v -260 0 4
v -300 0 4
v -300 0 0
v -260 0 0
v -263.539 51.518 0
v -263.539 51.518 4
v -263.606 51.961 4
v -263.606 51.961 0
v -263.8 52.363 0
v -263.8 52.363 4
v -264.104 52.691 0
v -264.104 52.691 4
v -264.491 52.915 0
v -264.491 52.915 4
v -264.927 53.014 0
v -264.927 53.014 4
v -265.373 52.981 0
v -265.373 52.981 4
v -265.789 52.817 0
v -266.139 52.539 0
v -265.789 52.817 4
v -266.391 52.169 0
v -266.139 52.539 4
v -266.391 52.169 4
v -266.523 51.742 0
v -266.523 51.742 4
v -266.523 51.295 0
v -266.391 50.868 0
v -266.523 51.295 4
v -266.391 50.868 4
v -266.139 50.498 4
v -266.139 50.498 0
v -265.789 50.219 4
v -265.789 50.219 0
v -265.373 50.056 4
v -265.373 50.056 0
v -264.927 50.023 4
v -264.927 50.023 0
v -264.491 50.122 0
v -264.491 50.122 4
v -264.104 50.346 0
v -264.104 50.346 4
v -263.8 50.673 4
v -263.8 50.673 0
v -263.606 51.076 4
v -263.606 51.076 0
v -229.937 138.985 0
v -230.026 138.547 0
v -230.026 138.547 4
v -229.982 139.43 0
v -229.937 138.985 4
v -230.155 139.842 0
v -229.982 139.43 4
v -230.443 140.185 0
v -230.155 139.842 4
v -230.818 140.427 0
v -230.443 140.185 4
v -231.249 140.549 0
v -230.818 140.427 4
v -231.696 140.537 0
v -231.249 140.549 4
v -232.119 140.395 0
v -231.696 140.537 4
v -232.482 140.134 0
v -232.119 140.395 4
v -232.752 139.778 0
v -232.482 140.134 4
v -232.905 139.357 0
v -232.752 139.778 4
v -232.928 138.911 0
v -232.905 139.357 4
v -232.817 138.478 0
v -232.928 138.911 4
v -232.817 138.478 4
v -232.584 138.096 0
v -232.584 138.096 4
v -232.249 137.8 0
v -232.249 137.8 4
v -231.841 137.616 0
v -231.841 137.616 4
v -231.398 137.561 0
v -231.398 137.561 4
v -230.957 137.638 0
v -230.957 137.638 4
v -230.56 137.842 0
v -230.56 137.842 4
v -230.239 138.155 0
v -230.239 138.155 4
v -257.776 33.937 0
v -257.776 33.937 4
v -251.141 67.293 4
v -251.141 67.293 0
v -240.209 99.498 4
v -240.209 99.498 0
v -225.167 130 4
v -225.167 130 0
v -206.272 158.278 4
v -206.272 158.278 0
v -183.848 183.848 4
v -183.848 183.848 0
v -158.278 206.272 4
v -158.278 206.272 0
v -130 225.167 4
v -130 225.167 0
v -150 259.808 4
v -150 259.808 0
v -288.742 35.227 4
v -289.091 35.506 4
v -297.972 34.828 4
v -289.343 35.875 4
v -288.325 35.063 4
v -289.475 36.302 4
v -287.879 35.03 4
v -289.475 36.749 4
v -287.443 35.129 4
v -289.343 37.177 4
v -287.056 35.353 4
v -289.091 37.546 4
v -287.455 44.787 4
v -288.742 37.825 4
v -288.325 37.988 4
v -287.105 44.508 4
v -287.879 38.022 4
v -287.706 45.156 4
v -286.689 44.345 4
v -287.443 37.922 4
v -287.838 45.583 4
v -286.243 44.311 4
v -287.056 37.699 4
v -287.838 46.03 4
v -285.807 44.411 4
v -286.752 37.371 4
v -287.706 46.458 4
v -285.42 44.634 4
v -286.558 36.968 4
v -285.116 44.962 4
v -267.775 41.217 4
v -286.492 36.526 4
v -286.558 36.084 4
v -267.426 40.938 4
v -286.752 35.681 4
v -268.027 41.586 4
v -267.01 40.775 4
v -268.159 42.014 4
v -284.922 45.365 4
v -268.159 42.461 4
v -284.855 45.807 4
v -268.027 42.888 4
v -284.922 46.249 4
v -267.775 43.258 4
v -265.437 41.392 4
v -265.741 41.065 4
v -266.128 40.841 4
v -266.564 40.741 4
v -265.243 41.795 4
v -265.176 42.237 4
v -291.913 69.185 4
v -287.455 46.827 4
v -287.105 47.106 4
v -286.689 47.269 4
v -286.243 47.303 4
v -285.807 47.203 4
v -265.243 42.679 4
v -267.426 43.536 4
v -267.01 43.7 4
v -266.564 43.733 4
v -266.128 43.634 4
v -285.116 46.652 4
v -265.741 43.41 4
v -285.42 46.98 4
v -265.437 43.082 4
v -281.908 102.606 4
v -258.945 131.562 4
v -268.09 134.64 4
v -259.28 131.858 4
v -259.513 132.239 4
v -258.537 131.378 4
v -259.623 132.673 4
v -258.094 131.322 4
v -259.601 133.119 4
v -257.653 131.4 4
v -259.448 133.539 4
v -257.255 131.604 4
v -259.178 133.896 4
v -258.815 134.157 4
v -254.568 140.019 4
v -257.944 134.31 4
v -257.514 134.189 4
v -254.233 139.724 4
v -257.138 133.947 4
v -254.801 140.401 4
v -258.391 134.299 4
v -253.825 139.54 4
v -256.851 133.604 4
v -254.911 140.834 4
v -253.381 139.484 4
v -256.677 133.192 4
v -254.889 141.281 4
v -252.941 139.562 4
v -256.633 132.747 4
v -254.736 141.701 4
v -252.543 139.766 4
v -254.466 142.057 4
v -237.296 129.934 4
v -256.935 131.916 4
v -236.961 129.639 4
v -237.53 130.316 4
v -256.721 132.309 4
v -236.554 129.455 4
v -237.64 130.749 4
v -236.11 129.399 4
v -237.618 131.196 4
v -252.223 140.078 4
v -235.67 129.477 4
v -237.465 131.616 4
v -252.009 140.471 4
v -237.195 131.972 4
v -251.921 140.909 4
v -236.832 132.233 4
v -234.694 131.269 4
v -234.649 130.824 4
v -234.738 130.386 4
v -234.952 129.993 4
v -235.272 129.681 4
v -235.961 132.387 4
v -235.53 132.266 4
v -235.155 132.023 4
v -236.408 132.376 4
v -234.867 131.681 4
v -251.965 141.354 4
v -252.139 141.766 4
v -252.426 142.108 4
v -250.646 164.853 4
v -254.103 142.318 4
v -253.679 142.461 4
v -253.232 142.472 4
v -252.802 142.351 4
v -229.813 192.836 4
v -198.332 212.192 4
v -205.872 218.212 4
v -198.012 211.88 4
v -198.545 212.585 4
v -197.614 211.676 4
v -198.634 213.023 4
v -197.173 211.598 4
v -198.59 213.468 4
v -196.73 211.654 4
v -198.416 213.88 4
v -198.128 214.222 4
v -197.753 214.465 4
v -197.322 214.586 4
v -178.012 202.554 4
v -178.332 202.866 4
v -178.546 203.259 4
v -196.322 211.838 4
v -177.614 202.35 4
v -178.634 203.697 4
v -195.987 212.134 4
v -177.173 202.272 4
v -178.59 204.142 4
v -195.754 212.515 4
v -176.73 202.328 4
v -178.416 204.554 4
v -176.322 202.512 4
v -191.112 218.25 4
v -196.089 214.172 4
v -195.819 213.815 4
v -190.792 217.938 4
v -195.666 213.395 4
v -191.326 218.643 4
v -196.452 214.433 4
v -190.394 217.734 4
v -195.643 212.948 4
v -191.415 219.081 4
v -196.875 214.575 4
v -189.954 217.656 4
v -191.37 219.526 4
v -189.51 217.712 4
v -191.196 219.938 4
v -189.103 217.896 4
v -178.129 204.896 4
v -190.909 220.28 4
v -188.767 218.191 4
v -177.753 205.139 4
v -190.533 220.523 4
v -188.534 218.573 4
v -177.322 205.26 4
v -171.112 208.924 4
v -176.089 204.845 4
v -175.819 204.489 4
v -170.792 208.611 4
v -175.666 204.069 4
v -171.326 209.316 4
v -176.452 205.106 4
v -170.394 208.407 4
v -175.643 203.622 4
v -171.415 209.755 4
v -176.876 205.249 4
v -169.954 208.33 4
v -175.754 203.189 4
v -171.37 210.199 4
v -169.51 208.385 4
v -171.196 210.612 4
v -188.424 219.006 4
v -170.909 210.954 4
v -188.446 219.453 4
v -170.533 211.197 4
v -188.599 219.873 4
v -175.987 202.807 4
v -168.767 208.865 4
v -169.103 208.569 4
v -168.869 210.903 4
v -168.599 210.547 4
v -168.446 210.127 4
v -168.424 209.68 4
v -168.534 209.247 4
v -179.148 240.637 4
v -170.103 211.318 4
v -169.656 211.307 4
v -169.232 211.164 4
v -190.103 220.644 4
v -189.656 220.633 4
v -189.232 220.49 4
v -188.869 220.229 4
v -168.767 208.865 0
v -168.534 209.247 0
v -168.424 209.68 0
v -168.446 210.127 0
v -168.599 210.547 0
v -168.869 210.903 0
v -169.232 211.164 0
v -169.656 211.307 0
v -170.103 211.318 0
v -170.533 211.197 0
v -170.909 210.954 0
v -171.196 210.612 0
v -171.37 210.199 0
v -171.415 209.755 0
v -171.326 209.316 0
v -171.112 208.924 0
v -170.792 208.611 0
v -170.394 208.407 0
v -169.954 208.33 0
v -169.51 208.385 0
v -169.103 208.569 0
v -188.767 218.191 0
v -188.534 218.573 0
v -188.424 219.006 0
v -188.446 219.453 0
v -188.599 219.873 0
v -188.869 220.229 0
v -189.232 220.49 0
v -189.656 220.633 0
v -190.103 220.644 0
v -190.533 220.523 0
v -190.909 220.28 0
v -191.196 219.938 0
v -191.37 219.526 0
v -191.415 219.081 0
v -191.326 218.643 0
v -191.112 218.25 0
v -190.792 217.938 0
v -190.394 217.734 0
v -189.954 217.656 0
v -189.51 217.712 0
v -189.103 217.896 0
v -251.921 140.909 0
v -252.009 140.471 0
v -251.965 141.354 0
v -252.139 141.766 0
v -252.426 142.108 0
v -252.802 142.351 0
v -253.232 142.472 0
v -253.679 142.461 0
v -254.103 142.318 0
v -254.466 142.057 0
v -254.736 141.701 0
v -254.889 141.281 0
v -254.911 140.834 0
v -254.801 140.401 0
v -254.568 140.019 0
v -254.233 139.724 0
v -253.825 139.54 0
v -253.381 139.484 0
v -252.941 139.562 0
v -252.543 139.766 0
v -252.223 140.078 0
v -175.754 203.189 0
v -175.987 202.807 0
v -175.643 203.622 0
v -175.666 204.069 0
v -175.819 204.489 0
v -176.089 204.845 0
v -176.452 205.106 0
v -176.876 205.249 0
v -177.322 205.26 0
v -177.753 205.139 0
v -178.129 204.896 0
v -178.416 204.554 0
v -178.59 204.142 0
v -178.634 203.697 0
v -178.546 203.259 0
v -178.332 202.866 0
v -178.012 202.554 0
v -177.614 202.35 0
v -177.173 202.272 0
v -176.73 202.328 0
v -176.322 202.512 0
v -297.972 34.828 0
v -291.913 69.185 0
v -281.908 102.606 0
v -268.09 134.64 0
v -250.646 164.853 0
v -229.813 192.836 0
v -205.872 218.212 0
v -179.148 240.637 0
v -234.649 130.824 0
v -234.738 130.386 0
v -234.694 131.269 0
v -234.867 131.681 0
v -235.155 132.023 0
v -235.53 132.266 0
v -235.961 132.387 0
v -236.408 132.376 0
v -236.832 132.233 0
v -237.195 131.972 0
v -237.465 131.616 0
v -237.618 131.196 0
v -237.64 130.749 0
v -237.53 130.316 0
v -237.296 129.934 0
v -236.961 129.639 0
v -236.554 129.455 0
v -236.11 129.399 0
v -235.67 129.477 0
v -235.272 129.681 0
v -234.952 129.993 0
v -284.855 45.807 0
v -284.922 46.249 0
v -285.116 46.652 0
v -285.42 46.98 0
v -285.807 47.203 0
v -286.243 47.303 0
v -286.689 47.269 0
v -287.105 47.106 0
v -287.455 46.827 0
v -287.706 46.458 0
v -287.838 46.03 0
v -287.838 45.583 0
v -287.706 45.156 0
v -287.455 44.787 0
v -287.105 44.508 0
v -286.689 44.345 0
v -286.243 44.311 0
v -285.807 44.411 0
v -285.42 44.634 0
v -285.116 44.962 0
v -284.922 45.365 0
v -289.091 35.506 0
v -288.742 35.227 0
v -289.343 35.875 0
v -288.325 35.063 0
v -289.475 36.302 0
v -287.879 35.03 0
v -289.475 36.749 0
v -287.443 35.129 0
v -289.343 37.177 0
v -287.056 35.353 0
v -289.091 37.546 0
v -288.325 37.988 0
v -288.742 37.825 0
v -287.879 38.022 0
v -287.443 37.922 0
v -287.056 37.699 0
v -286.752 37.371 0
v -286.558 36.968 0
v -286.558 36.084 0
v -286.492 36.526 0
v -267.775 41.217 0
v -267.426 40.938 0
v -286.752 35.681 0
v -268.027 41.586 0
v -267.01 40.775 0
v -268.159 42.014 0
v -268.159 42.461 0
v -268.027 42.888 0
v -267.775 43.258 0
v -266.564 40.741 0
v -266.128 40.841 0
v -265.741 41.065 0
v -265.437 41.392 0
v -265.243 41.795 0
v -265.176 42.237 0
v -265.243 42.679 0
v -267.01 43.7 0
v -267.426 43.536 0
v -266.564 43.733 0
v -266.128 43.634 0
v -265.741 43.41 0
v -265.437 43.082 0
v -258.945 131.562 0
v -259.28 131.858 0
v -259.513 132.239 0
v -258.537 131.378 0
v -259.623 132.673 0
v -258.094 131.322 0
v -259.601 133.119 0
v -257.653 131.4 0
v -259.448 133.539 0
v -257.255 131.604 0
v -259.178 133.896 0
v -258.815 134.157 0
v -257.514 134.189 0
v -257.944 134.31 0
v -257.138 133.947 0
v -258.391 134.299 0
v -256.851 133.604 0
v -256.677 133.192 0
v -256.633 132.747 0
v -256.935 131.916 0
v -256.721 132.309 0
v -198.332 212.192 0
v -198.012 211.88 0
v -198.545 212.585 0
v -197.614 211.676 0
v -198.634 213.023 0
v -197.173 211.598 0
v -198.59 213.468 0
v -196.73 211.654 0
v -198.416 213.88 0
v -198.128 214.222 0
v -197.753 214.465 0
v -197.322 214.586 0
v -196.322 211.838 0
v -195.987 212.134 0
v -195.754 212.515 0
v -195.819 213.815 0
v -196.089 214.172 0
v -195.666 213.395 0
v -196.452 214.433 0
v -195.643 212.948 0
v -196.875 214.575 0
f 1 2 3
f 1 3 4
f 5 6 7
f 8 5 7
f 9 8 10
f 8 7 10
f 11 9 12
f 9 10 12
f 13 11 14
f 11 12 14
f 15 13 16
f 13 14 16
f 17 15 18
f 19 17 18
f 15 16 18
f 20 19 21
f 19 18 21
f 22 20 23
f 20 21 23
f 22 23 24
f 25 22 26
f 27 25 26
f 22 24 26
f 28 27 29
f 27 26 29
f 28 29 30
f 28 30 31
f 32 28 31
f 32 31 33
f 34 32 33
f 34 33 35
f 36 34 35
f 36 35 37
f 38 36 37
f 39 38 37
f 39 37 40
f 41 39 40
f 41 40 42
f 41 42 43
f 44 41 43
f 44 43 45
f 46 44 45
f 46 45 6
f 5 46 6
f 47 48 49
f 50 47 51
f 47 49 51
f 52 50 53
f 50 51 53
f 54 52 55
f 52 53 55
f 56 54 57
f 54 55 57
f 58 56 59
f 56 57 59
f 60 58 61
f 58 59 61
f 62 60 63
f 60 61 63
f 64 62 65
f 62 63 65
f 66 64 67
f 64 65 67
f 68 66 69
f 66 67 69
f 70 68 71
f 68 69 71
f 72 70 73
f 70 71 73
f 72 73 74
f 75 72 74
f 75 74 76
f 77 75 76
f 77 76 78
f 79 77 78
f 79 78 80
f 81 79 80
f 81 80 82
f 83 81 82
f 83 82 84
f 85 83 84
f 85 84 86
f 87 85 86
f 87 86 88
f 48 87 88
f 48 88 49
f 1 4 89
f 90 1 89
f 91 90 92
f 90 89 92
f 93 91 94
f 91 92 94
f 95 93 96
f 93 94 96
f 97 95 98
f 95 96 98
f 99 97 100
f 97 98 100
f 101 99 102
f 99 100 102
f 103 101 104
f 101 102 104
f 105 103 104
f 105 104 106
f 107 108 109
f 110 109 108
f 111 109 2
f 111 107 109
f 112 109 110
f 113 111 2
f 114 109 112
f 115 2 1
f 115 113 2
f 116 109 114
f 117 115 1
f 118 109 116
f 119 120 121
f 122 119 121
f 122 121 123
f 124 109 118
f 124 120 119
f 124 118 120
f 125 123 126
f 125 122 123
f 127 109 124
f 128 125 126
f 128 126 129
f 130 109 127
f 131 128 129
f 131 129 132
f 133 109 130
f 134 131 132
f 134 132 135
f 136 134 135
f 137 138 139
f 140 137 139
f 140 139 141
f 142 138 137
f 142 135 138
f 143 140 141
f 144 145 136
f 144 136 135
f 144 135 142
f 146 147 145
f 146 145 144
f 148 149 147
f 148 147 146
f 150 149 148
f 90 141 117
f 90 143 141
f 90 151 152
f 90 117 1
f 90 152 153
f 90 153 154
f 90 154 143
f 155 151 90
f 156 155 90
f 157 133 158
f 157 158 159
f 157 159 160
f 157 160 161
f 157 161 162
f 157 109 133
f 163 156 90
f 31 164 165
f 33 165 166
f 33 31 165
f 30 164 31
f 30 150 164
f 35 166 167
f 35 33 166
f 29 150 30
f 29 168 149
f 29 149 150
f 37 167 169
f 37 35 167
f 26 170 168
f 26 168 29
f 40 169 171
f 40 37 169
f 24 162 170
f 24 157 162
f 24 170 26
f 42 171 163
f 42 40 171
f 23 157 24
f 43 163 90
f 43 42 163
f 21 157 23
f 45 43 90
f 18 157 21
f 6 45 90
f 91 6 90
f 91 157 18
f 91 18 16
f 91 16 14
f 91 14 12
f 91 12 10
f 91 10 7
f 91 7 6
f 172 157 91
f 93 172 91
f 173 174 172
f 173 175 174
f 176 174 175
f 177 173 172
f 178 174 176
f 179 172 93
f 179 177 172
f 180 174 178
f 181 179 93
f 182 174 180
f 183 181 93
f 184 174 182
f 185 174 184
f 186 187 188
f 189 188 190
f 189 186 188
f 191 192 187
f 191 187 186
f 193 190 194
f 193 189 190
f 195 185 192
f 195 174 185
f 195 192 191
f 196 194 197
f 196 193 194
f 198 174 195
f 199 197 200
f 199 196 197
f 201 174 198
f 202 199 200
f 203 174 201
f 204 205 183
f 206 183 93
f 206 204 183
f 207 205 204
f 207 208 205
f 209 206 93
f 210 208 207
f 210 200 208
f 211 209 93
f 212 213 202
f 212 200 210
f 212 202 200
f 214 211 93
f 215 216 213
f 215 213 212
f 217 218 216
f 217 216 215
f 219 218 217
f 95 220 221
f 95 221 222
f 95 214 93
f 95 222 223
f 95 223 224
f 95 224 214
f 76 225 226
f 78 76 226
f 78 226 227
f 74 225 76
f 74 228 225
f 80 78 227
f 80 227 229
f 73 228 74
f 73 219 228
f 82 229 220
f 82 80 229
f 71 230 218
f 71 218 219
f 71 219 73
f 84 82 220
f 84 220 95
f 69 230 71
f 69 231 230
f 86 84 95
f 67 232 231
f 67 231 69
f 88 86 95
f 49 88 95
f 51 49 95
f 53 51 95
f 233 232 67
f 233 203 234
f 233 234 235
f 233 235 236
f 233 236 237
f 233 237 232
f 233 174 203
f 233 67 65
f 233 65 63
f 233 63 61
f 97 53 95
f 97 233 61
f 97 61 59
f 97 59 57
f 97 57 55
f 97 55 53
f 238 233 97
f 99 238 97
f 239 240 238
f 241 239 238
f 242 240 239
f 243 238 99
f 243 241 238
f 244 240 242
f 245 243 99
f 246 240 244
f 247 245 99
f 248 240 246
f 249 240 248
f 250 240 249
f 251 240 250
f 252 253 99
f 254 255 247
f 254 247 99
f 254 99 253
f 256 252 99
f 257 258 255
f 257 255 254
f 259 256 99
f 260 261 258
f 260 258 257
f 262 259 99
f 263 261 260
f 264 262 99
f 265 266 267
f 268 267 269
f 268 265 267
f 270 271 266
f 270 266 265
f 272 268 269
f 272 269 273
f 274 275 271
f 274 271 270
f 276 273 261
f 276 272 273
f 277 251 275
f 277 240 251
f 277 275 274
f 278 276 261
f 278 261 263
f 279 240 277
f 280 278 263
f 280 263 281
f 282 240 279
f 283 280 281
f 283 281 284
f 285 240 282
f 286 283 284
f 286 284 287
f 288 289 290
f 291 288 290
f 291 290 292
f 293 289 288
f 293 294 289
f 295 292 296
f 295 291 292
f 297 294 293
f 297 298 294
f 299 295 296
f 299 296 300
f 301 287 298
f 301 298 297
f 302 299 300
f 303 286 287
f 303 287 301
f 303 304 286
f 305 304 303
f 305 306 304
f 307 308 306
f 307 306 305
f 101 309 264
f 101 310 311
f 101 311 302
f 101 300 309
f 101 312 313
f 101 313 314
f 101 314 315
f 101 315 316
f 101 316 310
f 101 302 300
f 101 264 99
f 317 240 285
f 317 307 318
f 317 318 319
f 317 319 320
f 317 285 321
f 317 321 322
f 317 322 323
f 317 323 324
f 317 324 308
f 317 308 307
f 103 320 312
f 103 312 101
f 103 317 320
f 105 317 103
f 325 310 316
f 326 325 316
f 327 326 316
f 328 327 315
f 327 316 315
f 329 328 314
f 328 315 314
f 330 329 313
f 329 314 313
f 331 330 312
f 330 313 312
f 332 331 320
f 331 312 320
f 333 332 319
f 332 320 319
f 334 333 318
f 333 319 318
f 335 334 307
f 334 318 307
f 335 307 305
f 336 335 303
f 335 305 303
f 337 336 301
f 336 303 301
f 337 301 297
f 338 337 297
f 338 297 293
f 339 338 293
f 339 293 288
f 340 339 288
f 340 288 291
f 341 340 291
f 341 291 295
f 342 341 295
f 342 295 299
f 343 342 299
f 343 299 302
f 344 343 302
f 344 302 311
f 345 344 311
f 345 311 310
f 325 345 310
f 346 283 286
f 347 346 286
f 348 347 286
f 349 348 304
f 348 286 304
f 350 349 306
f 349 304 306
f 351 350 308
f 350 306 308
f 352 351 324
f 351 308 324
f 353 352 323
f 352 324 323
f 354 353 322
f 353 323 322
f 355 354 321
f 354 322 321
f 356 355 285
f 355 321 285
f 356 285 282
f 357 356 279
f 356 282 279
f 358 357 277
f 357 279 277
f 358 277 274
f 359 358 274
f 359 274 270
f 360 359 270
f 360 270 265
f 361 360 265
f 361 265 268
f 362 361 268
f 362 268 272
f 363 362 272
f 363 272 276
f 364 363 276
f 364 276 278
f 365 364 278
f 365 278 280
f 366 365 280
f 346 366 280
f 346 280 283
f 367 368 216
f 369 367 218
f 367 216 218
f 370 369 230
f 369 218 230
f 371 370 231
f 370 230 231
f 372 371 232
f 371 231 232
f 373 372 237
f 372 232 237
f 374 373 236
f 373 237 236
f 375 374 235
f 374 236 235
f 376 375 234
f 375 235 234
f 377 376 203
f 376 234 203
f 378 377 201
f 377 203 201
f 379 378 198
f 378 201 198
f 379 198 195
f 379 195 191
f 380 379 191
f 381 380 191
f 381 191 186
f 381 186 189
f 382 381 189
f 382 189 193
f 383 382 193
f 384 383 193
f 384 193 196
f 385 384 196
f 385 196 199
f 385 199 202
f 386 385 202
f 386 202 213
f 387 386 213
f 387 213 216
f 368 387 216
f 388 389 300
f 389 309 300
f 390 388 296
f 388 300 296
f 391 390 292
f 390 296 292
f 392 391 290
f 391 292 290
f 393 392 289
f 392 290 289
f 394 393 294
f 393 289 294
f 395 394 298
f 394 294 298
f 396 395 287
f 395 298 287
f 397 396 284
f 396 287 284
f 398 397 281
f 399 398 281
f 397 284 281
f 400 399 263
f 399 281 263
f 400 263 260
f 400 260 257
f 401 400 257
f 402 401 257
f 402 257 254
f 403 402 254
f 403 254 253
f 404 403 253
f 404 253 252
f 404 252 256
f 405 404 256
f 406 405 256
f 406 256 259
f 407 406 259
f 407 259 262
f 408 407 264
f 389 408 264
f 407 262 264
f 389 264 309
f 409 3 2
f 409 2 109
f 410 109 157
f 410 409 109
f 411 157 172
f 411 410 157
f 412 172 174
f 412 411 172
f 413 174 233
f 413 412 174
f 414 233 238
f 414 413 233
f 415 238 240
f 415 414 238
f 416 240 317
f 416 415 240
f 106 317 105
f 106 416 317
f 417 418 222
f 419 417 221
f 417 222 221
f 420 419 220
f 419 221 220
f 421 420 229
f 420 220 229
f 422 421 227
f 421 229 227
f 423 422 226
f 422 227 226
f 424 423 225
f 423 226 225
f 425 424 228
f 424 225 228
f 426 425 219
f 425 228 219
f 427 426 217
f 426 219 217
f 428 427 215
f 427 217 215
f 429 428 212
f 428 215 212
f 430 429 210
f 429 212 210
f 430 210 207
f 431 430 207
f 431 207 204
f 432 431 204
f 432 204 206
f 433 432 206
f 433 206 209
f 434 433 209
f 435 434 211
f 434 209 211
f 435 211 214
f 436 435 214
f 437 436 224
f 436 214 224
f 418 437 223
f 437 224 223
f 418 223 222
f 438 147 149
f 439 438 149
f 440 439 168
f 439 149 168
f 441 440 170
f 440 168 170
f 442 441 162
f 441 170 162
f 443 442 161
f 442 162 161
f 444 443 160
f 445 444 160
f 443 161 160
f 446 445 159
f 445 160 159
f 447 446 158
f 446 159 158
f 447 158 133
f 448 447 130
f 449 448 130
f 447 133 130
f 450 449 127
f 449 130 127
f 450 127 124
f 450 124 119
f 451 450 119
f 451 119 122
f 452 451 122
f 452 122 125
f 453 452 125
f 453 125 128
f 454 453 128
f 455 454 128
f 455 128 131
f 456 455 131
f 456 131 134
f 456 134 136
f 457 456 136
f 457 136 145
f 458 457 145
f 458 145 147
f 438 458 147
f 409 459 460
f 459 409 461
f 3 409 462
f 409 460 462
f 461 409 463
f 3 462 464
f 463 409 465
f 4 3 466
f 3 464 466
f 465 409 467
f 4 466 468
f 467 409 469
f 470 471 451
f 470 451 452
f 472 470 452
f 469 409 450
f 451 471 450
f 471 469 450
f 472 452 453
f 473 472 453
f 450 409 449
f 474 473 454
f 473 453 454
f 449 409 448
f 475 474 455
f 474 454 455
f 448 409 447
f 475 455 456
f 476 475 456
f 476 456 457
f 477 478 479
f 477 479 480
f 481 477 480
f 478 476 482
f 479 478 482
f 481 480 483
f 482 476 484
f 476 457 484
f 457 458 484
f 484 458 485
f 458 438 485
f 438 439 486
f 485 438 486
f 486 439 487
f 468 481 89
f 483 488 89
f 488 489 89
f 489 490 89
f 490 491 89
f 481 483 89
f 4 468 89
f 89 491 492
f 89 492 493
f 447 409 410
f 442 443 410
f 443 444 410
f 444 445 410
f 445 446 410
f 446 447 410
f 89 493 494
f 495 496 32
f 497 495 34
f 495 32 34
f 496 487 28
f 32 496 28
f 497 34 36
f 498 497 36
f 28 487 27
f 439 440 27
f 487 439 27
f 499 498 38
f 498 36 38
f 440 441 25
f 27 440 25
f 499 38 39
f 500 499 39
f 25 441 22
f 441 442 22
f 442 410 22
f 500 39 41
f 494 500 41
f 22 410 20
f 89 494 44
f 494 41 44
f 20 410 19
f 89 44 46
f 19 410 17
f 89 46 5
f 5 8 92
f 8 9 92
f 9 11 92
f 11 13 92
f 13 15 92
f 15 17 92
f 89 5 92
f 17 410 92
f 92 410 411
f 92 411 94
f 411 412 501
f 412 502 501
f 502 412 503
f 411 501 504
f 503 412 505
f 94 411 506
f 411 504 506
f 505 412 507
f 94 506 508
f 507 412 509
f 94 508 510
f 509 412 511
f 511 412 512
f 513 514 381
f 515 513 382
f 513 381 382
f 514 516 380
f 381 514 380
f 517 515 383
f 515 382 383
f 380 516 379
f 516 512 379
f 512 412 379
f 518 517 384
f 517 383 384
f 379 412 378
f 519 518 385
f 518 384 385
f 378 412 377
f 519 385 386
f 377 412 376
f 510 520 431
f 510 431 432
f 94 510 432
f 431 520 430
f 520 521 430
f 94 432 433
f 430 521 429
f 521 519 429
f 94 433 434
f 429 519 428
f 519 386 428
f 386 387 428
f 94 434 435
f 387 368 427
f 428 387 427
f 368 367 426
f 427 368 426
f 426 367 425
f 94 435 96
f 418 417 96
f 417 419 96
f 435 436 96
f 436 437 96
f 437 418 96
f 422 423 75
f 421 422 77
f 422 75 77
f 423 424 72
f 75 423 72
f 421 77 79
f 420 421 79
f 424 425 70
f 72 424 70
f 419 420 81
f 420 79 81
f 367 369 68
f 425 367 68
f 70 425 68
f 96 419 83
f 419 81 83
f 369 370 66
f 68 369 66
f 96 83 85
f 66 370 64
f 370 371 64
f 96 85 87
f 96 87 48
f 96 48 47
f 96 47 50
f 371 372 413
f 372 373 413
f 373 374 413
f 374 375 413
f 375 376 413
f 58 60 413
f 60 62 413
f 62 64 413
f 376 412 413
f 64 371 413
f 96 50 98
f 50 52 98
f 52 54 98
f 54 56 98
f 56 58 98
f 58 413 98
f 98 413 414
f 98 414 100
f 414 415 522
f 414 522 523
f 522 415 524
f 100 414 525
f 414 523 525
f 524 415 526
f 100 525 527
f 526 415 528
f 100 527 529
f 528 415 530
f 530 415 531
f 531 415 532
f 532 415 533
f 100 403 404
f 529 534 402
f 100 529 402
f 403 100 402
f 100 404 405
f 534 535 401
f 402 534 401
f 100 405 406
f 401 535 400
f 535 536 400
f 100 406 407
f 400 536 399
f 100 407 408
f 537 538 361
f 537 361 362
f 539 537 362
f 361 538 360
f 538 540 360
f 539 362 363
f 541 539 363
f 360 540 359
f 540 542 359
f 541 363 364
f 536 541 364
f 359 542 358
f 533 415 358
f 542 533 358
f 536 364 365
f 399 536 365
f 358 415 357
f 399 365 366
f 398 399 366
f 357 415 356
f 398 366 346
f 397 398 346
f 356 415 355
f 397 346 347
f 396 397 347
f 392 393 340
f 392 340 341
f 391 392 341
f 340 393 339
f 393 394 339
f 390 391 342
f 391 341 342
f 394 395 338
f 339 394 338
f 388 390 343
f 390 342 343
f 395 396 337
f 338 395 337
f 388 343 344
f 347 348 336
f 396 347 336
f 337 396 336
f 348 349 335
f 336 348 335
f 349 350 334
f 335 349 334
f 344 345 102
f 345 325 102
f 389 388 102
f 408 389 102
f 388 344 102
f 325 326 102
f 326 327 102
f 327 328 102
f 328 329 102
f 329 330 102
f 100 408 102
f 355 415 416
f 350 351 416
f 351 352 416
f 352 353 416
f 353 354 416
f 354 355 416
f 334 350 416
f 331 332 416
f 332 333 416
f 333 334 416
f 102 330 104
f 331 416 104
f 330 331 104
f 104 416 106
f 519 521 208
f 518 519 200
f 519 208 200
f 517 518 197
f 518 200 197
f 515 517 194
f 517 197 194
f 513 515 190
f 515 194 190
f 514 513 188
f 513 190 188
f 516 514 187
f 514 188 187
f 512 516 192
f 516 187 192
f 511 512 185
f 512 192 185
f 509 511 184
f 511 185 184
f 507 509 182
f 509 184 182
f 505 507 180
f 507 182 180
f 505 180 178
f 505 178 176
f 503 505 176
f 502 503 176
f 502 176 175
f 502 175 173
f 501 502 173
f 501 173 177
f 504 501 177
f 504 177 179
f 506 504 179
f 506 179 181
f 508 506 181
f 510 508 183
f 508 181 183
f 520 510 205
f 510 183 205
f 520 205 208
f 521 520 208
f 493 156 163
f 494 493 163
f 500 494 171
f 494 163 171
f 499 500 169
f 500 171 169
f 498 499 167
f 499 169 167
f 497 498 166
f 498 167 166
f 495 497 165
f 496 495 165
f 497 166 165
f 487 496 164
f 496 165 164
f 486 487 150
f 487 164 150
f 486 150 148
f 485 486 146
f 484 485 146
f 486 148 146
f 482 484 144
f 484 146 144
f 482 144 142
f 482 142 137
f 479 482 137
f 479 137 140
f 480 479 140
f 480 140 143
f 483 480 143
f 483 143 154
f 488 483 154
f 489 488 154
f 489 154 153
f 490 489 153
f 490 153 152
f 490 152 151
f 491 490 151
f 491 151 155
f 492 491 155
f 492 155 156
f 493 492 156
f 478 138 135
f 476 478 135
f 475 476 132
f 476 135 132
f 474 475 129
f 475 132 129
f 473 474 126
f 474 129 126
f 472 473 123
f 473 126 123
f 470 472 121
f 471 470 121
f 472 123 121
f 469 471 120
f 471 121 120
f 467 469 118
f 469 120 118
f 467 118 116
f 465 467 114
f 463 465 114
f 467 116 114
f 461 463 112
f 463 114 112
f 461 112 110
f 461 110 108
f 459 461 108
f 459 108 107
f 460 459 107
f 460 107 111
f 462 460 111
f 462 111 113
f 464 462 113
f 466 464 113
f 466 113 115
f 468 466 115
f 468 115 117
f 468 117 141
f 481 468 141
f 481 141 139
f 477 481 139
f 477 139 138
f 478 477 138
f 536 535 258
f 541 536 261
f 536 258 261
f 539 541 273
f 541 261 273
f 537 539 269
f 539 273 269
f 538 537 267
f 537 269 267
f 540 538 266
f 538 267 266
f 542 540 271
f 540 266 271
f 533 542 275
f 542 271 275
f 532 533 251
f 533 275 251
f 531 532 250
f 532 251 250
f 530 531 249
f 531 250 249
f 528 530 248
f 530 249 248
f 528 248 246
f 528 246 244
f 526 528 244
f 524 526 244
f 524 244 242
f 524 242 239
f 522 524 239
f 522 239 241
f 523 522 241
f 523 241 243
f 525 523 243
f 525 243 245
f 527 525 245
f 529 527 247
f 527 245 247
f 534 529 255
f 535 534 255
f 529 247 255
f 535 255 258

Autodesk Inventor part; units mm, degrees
ref_plane "YZ Plane" through (0, 0, 0) normal (1, 0, 0) x (0, 1, 0)
ref_plane "XZ Plane" through (0, 0, 0) normal (0, 1, 0) x (-1, 0, 0)
ref_plane "XY Plane" through (0, 0, 0) normal (0, 0, 1) x (1, 0, 0)
sketch "Sketch1" plane through (0, 0, 0) normal (0, 0, 1) x (1, 0, 0)
  circle A0 centre (0, 0) radius 260
  circle A1 centre (0, 0) radius 300
  dimension "d0" = 600
  dimension "d1" = 40
extrude "Extrusion1" add sketch "Sketch1" along normal blind 4
sketch "Sketch2" plane through (0, 0, 4) normal (0, 0, 1) x (1, 0, 0)
  line L0 (300, 35.8531) -> (300, -300)
  line L1 (300, -300) -> (-300, -300)
  line L2 (-300, -300) -> (-300, 0)
  circle A0 centre (0, 0) radius 300 projected
  line L3 (-420, 0) -> (420, 0) projected
  circle A1 centre (0, 0) radius 300 projected
  line L4 (-300, 0) -> (0, 0)
  line L5 (0, 0) -> (-150, 259.8076)
  line L6 (-150, 259.8076) -> (-150, 300)
  line L7 (-150, 300) -> (300, 300)
  line L8 (300, 300) -> (300, 35.8531)
  dimension "d25" = 60
extrude "Extrusion2" cut sketch "Sketch2" against normal blind 10 contours L3 L5 A0 | A0 L3 picked at (97.6489, 174.3647)
sketch "Sketch3" plane through (0, 0, 4) normal (0, 0, 1) x (1, 0, 0)
  circle A0 centre (-287.9915, 36.5258) radius 1.5
  circle A1 centre (-266.6759, 42.2373) radius 1.5
  line L0 (-420, 0) -> (420, 0) projected
  circle A2 centre (-286.355, 45.8069) radius 1.5
  circle A3 centre (-265.0393, 51.5184) radius 1.5
  line L1 (-266.6759, 42.2373) -> (-287.9915, 36.5258)
  line L2 (-287.9915, 36.5258) -> (-286.355, 45.8069)
  line L3 (-286.355, 45.8069) -> (-265.0393, 51.5184)
  line L4 (-265.0393, 51.5184) -> (-266.6759, 42.2373)
  line L5 (-265.0393, 51.5184) -> (0, 0)
  line L6 (0, 0) -> (-266.6759, 42.2373)
  dimension "d6" = 3
  dimension "d7" = 3
  dimension "d9" = 270
  dimension "d11" = 3
  dimension "d12" = 3
  dimension "d14" = 270
  dimension "d21" = 115
  dimension "d22" = 20
  dimension "d23" = 9
  dimension "d24" = 11
extrude "Extrusion3" cut sketch "Sketch3" against normal through all contours A0 L2 L1 | L1 L2 A0 | L1 L6 A1 | A1 L4 L1 | L2 L3 A2 | A2 L3 L2 | A1 L6 L4 | L4 L5 A3 | A3 L3 L4 | A3 L5 L3
pattern_circular "Circular Pattern1" count 9 over 160 about axis through (0, 0, 0) along (0, 0, -1) of "Extrusion3"
properties part number "wheel7"
